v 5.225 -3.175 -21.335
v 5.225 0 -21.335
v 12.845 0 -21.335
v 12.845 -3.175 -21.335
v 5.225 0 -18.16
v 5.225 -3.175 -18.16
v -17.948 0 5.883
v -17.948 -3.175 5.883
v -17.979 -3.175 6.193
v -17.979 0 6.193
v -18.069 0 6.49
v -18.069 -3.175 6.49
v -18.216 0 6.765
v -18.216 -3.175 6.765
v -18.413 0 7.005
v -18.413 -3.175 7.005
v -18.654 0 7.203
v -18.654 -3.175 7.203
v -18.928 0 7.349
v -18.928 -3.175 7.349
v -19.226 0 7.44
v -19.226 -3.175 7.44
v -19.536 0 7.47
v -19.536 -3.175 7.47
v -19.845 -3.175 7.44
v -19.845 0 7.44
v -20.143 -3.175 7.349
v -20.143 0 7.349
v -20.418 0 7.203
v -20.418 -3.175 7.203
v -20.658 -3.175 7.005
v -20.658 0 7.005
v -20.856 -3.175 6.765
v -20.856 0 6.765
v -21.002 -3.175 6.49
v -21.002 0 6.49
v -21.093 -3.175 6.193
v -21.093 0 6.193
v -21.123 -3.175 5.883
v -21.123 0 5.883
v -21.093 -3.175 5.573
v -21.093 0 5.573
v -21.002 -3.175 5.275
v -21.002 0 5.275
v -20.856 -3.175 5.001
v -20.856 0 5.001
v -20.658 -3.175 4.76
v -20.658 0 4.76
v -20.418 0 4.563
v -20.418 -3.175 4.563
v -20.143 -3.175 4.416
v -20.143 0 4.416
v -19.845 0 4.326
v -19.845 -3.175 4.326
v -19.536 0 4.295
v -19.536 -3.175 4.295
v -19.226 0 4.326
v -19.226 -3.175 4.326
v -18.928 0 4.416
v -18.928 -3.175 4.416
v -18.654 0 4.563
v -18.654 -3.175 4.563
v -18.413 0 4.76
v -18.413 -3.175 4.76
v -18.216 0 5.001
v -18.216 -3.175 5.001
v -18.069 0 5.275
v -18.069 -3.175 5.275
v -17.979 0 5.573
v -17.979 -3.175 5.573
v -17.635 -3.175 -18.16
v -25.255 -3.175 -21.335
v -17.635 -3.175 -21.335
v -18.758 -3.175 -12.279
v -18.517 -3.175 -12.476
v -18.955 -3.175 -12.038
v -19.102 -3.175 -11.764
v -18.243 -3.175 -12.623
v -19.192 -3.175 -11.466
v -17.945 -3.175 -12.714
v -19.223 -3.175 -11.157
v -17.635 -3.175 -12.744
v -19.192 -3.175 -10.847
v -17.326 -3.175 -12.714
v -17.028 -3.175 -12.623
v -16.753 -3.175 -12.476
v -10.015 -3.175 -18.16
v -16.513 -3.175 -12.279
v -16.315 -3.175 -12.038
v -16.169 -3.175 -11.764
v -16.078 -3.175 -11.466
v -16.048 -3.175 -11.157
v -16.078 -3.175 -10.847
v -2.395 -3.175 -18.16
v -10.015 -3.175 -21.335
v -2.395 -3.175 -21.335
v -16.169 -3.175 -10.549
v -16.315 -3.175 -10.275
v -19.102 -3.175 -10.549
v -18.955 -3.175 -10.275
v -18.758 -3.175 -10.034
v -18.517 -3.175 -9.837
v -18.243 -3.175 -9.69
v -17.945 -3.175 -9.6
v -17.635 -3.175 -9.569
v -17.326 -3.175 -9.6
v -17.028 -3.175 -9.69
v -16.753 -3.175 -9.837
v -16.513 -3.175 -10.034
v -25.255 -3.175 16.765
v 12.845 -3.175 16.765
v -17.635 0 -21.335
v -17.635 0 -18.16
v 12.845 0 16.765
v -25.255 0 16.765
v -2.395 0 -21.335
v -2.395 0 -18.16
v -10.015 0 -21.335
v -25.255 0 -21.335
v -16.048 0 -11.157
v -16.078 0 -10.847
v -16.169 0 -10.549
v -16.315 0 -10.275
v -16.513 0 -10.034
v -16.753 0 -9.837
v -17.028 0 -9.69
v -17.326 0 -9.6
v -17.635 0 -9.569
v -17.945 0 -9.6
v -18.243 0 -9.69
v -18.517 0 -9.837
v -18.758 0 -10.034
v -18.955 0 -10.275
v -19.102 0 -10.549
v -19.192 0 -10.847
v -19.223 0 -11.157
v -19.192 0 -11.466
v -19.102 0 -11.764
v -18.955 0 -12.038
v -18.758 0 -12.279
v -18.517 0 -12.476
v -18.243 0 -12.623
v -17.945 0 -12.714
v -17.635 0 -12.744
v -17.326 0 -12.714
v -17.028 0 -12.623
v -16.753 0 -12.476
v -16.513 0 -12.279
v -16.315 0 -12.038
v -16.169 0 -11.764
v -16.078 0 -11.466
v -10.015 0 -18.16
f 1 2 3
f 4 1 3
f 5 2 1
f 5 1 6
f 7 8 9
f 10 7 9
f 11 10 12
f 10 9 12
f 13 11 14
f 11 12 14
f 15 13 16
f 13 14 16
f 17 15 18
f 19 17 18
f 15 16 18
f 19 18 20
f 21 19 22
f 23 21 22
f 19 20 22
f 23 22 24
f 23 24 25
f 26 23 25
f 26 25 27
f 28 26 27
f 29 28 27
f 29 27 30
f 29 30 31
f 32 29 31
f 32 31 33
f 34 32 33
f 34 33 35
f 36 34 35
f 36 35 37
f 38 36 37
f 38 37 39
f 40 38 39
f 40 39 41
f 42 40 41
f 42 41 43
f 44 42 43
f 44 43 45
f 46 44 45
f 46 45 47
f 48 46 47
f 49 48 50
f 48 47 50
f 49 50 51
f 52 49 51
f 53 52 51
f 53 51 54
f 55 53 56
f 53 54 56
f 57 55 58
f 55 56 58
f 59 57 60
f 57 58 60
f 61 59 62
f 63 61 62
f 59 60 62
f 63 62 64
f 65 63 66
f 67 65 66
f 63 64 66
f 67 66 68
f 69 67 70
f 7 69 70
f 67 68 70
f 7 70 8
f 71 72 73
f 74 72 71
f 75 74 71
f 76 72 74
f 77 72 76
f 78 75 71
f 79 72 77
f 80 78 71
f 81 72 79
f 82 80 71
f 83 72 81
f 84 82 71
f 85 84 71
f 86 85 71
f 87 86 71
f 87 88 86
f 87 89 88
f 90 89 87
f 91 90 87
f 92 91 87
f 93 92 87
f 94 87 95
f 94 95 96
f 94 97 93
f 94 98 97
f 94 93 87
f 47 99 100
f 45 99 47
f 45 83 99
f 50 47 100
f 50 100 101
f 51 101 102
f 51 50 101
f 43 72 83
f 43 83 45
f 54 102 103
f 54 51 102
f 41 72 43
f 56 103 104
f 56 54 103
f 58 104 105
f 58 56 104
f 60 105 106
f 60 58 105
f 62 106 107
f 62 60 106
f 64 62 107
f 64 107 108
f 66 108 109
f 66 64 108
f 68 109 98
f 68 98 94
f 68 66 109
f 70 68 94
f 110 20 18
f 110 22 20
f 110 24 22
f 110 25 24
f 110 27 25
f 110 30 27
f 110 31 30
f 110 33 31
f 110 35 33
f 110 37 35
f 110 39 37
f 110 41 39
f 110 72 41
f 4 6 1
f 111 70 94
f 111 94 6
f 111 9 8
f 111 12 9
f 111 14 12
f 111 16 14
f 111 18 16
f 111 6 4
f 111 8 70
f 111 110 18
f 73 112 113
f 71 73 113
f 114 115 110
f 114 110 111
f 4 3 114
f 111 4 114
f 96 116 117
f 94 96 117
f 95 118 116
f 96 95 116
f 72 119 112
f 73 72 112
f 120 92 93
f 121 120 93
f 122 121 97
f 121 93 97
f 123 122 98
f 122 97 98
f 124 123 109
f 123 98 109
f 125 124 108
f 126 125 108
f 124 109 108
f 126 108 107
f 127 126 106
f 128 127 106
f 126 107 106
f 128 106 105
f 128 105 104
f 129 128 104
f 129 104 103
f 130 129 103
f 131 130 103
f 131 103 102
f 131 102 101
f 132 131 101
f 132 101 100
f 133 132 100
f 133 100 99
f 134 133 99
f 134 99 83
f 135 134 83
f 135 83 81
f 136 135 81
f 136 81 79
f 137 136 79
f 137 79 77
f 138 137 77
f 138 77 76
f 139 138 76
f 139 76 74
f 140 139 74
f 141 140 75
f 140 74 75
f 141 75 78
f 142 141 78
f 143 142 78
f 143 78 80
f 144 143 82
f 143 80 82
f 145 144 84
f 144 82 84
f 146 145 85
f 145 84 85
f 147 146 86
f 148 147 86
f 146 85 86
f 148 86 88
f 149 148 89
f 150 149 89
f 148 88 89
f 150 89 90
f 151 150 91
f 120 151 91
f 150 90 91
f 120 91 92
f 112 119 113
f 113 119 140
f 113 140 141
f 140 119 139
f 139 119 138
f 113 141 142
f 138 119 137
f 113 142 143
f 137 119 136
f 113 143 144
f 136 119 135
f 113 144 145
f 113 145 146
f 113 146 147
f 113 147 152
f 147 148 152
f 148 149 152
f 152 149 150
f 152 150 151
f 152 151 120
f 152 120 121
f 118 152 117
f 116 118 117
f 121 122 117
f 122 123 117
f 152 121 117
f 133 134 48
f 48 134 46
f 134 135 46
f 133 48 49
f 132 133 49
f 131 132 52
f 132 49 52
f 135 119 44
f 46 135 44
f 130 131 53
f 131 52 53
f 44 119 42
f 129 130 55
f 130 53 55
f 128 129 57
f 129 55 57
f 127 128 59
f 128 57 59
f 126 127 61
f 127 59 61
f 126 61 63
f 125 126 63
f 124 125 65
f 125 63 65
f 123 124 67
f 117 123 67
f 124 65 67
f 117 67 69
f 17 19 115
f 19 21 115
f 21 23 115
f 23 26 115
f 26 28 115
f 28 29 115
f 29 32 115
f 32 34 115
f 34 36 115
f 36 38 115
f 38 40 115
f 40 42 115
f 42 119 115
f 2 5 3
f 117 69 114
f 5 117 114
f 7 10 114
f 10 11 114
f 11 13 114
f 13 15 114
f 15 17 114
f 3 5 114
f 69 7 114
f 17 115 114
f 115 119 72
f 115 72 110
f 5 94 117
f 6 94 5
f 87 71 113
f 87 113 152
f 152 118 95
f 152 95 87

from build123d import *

# Parameters (mm, degrees)
F0_W     = 38.1
F0_H     = 38.1
F1_DEPTH = 3.175
F2_W     = 7.62
F2_H     = 3.175
F2_R     = 1.5875
F3_DEPTH = 3.175
F4_DEPTH = 2.54


with BuildPart() as f1:
    # F0 (on Front) → F1 (new body)
    with BuildSketch(Plane.XZ):
        with Locations((-6.205209, -2.285485)):
            Rectangle(F0_W, F0_H)
    extrude(amount=F1_DEPTH)

    # F2 (on face) → F3 (cut)
    with BuildSketch(Plane.XZ.offset(3.175)):
        with Locations((-13.825209, -19.747985)):
            Rectangle(F2_W, F2_H)
        with Locations((1.414791, -19.747985)):
            Rectangle(F2_W, F2_H)
        with Locations((-19.535628, 5.882839)):
            Circle(F2_R)
        with Locations((-17.635209, -11.156511)):
            Circle(F2_R)
    extrude(amount=-F3_DEPTH, mode=Mode.SUBTRACT)

    # F2 (on face) → F4 (cut)
    with BuildSketch(Plane.XZ.offset(3.175)):
        with Locations((-17.635209, -11.156511)):
            Circle(F2_R)
        with Locations((-19.535628, 5.882839)):
            Circle(F2_R)
    extrude(amount=-F4_DEPTH, mode=Mode.SUBTRACT)


solid = f1.part
